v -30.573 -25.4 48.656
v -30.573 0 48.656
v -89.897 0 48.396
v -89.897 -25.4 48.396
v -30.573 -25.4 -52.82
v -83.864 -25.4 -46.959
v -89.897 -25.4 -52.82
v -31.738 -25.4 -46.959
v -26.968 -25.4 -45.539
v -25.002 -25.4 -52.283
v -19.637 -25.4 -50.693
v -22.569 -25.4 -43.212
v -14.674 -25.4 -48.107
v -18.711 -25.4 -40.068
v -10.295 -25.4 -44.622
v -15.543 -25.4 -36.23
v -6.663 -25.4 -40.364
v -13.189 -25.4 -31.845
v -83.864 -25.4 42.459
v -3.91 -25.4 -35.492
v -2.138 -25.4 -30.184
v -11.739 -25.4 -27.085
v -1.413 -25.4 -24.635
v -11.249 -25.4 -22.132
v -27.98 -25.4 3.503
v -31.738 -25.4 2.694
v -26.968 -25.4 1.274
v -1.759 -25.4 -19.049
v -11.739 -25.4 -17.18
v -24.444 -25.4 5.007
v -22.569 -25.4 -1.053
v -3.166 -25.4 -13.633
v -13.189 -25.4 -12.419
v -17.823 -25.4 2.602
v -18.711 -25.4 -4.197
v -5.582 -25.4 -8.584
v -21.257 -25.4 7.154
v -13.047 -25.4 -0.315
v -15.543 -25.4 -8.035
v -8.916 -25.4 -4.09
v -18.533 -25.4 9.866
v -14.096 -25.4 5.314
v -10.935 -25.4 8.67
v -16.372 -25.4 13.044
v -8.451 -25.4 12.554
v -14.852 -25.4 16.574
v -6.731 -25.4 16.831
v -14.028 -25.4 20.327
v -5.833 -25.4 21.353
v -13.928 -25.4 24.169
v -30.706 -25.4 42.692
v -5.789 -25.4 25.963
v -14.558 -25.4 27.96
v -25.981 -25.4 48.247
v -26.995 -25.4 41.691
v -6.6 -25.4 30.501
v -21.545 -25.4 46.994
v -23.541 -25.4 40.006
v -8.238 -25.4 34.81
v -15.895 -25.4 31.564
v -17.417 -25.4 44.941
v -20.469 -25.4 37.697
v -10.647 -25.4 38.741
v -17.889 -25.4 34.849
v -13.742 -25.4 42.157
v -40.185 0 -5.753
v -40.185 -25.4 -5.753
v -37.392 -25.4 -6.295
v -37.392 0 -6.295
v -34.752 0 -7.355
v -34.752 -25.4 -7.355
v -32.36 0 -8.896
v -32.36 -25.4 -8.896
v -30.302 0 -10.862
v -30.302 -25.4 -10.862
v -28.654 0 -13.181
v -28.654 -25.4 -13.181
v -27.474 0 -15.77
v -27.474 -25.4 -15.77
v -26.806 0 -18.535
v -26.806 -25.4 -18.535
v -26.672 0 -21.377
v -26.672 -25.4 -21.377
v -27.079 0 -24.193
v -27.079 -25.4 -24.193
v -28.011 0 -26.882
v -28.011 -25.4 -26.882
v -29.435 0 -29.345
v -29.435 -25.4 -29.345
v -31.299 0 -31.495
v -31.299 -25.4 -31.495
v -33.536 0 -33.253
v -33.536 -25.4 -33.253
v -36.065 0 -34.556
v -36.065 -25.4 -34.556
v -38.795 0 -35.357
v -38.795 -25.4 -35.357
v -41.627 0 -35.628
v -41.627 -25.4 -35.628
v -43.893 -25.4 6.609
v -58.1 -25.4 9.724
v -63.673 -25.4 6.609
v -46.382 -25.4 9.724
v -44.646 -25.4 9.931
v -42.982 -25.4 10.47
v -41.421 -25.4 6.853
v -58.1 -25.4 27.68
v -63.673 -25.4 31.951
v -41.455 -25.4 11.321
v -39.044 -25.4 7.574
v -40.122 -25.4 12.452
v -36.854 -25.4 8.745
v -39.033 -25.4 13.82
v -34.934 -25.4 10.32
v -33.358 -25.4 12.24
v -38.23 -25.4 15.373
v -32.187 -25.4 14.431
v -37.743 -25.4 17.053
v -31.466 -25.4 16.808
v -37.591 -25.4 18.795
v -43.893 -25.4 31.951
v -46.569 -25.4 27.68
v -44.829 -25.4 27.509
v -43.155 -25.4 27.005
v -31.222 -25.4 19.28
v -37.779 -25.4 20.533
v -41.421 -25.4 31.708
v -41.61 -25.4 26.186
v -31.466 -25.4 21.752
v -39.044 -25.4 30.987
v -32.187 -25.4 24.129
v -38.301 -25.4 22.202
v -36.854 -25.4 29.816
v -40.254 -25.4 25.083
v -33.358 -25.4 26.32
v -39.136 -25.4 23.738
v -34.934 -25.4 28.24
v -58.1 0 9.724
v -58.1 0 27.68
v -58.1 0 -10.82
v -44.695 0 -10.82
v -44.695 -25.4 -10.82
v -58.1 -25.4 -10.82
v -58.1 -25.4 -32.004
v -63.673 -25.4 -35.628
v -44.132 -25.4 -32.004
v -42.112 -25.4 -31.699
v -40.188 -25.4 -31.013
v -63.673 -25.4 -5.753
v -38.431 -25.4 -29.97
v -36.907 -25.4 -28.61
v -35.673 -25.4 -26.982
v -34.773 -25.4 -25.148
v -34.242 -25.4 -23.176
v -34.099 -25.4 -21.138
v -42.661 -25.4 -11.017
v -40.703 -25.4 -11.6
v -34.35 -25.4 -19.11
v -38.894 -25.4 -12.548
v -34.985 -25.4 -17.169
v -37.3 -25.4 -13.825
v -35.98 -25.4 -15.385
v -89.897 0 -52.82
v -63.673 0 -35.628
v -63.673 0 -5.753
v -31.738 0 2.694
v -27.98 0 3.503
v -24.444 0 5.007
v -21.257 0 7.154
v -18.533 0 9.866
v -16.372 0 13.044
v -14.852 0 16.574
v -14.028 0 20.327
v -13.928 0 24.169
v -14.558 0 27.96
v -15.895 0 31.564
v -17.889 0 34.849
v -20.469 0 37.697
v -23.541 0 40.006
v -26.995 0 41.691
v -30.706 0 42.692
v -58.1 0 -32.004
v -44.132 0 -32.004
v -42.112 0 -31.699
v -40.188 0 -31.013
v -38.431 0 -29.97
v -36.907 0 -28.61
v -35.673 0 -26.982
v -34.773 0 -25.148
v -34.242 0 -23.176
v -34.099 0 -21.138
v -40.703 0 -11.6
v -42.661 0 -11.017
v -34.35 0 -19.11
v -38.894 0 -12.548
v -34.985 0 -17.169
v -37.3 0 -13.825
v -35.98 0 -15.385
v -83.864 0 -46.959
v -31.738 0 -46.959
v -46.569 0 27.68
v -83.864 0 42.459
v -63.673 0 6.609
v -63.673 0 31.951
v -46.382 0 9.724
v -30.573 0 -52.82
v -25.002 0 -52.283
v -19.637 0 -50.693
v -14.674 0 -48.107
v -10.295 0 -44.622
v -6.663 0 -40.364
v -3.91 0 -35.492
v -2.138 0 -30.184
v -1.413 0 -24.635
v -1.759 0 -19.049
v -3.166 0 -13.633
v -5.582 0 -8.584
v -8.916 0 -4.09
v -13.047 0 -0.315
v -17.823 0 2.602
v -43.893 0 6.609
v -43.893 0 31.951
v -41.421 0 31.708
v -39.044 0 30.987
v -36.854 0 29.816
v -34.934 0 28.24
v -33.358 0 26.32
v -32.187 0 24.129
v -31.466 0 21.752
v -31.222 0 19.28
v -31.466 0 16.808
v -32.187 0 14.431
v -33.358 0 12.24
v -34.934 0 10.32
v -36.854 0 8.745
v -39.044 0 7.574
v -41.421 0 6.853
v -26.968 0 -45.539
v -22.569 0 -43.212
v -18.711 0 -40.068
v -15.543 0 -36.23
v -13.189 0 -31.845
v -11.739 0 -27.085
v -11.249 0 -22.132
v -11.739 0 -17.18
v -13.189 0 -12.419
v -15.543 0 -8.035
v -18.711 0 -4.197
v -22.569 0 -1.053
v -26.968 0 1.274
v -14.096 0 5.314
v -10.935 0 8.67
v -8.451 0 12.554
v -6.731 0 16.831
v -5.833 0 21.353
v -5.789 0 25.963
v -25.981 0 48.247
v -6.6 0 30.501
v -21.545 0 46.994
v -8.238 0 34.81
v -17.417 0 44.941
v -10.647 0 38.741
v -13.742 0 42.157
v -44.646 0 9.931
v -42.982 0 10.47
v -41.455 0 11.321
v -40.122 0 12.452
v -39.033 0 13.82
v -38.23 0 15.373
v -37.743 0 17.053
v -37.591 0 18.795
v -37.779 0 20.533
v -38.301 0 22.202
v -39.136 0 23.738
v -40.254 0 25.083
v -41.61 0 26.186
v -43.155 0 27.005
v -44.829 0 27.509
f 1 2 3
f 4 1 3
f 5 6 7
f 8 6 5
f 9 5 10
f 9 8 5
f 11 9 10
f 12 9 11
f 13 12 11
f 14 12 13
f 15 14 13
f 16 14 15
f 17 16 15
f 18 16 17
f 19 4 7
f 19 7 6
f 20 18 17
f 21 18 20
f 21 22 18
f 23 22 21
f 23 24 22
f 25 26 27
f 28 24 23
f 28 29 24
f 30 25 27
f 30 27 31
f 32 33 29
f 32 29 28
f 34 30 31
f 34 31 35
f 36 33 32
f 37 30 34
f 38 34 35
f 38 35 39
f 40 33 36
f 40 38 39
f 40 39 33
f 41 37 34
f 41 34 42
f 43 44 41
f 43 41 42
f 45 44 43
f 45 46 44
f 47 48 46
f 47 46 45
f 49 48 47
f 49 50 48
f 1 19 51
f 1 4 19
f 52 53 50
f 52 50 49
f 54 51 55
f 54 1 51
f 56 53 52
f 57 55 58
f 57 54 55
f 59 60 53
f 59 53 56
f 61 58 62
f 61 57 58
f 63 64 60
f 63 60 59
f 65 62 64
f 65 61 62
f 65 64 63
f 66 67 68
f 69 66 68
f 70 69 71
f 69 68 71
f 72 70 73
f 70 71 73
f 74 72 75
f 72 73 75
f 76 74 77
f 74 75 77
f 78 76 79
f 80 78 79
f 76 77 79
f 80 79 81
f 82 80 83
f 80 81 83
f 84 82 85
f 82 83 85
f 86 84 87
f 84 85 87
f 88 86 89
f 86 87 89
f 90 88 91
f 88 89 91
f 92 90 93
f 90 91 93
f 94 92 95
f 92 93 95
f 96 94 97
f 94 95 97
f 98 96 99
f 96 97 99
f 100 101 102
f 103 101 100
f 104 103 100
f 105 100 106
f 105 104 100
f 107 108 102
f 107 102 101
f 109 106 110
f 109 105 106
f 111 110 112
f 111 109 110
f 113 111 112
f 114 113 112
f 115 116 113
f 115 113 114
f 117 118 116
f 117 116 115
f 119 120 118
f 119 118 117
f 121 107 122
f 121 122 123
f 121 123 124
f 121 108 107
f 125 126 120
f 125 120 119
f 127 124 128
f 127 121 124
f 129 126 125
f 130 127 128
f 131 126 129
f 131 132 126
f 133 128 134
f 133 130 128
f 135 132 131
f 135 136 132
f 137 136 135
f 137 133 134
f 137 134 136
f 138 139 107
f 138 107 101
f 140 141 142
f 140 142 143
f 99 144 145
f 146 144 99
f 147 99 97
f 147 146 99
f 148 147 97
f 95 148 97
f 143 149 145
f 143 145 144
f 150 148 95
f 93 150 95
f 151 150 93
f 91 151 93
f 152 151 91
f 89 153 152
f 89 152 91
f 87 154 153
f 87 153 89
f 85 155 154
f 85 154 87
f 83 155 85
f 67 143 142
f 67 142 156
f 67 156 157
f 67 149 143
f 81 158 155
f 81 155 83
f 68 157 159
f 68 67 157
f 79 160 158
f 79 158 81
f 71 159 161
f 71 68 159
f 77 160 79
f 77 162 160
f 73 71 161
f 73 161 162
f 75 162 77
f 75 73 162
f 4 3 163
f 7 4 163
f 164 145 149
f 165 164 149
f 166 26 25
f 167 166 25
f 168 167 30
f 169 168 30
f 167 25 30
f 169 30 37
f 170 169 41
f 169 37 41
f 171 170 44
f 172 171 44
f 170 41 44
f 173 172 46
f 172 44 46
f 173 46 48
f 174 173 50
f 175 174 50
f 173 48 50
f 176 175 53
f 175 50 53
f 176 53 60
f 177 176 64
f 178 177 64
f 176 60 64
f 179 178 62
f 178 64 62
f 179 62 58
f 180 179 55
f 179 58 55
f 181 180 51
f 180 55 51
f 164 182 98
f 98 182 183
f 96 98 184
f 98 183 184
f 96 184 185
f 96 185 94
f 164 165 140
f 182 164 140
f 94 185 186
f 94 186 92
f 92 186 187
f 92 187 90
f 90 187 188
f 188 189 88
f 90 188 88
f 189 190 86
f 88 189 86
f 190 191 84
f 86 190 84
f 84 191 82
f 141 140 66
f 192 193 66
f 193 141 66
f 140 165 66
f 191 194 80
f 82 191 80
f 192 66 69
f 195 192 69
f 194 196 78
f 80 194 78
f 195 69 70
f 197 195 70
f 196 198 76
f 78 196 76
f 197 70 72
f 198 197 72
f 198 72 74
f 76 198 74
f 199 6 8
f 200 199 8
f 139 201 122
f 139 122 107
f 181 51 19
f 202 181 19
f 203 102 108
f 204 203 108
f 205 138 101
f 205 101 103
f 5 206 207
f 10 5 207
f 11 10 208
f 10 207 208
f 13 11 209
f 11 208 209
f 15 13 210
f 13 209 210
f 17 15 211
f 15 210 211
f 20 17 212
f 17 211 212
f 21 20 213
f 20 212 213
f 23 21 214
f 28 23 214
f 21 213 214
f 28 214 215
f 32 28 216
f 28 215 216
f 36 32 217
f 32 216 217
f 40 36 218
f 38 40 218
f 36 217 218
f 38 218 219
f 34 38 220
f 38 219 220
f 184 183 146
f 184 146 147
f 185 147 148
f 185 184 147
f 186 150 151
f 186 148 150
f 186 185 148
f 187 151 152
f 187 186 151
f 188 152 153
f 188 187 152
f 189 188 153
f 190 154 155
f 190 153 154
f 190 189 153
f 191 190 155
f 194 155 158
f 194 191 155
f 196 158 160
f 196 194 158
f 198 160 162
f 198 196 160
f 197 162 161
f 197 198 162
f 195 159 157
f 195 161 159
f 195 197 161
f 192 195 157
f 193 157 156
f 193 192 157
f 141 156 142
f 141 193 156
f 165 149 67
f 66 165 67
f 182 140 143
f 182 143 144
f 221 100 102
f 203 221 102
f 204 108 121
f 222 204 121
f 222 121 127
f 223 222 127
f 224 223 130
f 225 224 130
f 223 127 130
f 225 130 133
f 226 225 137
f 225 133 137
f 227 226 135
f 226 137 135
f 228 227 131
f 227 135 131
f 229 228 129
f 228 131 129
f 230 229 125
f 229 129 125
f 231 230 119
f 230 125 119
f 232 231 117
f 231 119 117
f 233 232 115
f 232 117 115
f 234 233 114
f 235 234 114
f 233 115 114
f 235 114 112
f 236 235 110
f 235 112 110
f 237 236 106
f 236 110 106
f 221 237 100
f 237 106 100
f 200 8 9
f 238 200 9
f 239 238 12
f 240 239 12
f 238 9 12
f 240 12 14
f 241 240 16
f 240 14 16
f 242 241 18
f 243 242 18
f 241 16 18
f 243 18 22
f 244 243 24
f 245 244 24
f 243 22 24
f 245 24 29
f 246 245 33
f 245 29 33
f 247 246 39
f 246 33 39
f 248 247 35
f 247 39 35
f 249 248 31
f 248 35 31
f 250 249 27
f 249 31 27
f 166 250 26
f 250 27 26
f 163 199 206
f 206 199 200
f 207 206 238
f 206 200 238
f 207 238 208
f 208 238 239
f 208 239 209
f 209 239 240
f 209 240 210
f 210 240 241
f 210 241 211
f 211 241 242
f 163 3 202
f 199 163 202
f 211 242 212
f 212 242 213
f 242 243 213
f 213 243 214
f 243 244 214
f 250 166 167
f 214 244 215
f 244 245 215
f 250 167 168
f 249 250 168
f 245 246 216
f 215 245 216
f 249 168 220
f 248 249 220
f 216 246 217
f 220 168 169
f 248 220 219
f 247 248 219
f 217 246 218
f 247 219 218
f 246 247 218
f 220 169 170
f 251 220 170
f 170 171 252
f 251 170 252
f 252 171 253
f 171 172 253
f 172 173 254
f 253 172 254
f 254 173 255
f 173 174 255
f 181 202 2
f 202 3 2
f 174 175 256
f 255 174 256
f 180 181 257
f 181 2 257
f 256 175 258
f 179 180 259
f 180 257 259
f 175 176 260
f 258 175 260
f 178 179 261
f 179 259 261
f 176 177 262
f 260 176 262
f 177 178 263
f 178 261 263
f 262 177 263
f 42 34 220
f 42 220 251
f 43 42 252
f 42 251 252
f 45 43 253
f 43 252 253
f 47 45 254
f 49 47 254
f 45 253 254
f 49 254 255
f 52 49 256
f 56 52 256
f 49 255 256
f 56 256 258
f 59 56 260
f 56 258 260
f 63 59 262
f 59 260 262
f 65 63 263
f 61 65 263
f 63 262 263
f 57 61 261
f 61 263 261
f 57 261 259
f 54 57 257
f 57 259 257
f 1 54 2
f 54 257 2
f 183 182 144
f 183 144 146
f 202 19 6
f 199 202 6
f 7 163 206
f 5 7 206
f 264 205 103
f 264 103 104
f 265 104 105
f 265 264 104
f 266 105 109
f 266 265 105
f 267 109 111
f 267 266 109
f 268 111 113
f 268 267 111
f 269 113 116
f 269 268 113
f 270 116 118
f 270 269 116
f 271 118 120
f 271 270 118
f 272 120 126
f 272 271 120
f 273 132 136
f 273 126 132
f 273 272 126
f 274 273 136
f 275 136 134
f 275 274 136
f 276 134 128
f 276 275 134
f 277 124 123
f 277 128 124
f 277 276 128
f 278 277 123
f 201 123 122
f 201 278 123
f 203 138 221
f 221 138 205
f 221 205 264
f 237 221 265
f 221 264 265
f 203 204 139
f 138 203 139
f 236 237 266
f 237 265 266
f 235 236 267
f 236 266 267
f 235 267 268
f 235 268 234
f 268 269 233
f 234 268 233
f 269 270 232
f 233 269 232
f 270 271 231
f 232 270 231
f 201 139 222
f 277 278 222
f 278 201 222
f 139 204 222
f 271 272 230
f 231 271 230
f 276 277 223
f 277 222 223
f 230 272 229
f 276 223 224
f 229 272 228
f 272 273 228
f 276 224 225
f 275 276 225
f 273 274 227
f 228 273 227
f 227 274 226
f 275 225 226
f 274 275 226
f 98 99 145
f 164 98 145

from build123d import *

# Parameters (mm, degrees)
F1_DEPTH = 25.4
F3_DEPTH = 25.4
F4_DEPTH = 53.848
F6_DEPTH = 25.4


with BuildPart() as f1:
    # F0 (on Front) → F1 (new body)
    with BuildSketch(Plane.XZ):
        with BuildLine():
            Line((-30.572927, 48.65649), (-89.897417, 48.396293))
            Line((-89.897417, 48.396293), (-89.897417, -52.819613))
            Line((-89.897417, -52.819613), (-30.572927, -52.819613))
            ThreePointArc((-30.572927, -52.819613), (-2.138348, -30.18362), (-17.823366, 2.601951))
            ThreePointArc((-17.823366, 2.601951), (-6.599701, 30.501106), (-30.572927, 48.65649))
        make_face()
    extrude(amount=F1_DEPTH)

    # F2 (on face) → F3 (cut)
    with BuildSketch(Plane.XZ):
        with BuildLine():
            Line((-46.569277, 27.679665), (-58.099557, 27.679665))
            Line((-58.099557, 27.679665), (-58.099557, 9.724027))
            Line((-58.099557, 9.724027), (-46.381809, 9.724027))
            ThreePointArc((-46.381809, 9.724027), (-37.590968, 18.794606), (-46.569277, 27.679665))
        make_face()
        with BuildLine():
            Line((-44.694602, -10.819801), (-58.099557, -10.819801))
            Line((-58.099557, -10.819801), (-58.099557, -32.003619))
            Line((-58.099557, -32.003619), (-44.132199, -32.003619))
            ThreePointArc((-44.132199, -32.003619), (-34.098962, -21.137875), (-44.694602, -10.819801))
        make_face()
    extrude(amount=-F3_DEPTH, mode=Mode.SUBTRACT)

    # F2 (on face) → F4 (cut)
    with BuildSketch(Plane.XZ):
        with BuildLine():
            Line((-46.569277, 27.679665), (-58.099557, 27.679665))
            Line((-58.099557, 27.679665), (-58.099557, 9.724027))
            Line((-58.099557, 9.724027), (-46.381809, 9.724027))
            ThreePointArc((-46.381809, 9.724027), (-37.590968, 18.794606), (-46.569277, 27.679665))
        make_face()
        with BuildLine():
            Line((-44.694602, -10.819801), (-58.099557, -10.819801))
            Line((-58.099557, -10.819801), (-58.099557, -32.003619))
            Line((-58.099557, -32.003619), (-44.132199, -32.003619))
            ThreePointArc((-44.132199, -32.003619), (-34.098962, -21.137875), (-44.694602, -10.819801))
        make_face()
    extrude(amount=F4_DEPTH, mode=Mode.SUBTRACT)

    # F5 (on face) → F6 (cut)
    with BuildSketch(Plane.XZ.offset(25.4)):
        with BuildLine():
            Line((-30.705677, 42.691864), (-83.86372, 42.458713))
            Line((-83.86372, 42.458713), (-83.86372, -46.959333))
            Line((-83.86372, -46.959333), (-31.737529, -46.959333))
            ThreePointArc((-31.737529, -46.959333), (-11.249094, -22.132434), (-31.737529, 2.694466))
            ThreePointArc((-31.737529, 2.694466), (-13.8865, 22.245954), (-30.705677, 42.691864))
        make_face()
        with BuildLine():
            Line((-41.627079, -35.627555), (-63.672543, -35.627555))
            Line((-63.672543, -35.627555), (-63.672543, -5.752861))
            Line((-63.672543, -5.752861), (-40.184855, -5.752861))
            ThreePointArc((-40.184855, -5.752861), (-26.672336, -21.377348), (-41.627079, -35.627555))
        make_face(mode=Mode.SUBTRACT)
        with BuildLine():
            Line((-63.672543, 6.609081), (-63.672543, 31.951062))
            Line((-63.672543, 31.951062), (-43.893438, 31.951062))
            ThreePointArc((-43.893438, 31.951062), (-31.222447, 19.280072), (-43.893438, 6.609081))
            Line((-43.893438, 6.609081), (-63.672543, 6.609081))
        make_face(mode=Mode.SUBTRACT)
    extrude(amount=-F6_DEPTH, mode=Mode.SUBTRACT)


solid = f1.part
